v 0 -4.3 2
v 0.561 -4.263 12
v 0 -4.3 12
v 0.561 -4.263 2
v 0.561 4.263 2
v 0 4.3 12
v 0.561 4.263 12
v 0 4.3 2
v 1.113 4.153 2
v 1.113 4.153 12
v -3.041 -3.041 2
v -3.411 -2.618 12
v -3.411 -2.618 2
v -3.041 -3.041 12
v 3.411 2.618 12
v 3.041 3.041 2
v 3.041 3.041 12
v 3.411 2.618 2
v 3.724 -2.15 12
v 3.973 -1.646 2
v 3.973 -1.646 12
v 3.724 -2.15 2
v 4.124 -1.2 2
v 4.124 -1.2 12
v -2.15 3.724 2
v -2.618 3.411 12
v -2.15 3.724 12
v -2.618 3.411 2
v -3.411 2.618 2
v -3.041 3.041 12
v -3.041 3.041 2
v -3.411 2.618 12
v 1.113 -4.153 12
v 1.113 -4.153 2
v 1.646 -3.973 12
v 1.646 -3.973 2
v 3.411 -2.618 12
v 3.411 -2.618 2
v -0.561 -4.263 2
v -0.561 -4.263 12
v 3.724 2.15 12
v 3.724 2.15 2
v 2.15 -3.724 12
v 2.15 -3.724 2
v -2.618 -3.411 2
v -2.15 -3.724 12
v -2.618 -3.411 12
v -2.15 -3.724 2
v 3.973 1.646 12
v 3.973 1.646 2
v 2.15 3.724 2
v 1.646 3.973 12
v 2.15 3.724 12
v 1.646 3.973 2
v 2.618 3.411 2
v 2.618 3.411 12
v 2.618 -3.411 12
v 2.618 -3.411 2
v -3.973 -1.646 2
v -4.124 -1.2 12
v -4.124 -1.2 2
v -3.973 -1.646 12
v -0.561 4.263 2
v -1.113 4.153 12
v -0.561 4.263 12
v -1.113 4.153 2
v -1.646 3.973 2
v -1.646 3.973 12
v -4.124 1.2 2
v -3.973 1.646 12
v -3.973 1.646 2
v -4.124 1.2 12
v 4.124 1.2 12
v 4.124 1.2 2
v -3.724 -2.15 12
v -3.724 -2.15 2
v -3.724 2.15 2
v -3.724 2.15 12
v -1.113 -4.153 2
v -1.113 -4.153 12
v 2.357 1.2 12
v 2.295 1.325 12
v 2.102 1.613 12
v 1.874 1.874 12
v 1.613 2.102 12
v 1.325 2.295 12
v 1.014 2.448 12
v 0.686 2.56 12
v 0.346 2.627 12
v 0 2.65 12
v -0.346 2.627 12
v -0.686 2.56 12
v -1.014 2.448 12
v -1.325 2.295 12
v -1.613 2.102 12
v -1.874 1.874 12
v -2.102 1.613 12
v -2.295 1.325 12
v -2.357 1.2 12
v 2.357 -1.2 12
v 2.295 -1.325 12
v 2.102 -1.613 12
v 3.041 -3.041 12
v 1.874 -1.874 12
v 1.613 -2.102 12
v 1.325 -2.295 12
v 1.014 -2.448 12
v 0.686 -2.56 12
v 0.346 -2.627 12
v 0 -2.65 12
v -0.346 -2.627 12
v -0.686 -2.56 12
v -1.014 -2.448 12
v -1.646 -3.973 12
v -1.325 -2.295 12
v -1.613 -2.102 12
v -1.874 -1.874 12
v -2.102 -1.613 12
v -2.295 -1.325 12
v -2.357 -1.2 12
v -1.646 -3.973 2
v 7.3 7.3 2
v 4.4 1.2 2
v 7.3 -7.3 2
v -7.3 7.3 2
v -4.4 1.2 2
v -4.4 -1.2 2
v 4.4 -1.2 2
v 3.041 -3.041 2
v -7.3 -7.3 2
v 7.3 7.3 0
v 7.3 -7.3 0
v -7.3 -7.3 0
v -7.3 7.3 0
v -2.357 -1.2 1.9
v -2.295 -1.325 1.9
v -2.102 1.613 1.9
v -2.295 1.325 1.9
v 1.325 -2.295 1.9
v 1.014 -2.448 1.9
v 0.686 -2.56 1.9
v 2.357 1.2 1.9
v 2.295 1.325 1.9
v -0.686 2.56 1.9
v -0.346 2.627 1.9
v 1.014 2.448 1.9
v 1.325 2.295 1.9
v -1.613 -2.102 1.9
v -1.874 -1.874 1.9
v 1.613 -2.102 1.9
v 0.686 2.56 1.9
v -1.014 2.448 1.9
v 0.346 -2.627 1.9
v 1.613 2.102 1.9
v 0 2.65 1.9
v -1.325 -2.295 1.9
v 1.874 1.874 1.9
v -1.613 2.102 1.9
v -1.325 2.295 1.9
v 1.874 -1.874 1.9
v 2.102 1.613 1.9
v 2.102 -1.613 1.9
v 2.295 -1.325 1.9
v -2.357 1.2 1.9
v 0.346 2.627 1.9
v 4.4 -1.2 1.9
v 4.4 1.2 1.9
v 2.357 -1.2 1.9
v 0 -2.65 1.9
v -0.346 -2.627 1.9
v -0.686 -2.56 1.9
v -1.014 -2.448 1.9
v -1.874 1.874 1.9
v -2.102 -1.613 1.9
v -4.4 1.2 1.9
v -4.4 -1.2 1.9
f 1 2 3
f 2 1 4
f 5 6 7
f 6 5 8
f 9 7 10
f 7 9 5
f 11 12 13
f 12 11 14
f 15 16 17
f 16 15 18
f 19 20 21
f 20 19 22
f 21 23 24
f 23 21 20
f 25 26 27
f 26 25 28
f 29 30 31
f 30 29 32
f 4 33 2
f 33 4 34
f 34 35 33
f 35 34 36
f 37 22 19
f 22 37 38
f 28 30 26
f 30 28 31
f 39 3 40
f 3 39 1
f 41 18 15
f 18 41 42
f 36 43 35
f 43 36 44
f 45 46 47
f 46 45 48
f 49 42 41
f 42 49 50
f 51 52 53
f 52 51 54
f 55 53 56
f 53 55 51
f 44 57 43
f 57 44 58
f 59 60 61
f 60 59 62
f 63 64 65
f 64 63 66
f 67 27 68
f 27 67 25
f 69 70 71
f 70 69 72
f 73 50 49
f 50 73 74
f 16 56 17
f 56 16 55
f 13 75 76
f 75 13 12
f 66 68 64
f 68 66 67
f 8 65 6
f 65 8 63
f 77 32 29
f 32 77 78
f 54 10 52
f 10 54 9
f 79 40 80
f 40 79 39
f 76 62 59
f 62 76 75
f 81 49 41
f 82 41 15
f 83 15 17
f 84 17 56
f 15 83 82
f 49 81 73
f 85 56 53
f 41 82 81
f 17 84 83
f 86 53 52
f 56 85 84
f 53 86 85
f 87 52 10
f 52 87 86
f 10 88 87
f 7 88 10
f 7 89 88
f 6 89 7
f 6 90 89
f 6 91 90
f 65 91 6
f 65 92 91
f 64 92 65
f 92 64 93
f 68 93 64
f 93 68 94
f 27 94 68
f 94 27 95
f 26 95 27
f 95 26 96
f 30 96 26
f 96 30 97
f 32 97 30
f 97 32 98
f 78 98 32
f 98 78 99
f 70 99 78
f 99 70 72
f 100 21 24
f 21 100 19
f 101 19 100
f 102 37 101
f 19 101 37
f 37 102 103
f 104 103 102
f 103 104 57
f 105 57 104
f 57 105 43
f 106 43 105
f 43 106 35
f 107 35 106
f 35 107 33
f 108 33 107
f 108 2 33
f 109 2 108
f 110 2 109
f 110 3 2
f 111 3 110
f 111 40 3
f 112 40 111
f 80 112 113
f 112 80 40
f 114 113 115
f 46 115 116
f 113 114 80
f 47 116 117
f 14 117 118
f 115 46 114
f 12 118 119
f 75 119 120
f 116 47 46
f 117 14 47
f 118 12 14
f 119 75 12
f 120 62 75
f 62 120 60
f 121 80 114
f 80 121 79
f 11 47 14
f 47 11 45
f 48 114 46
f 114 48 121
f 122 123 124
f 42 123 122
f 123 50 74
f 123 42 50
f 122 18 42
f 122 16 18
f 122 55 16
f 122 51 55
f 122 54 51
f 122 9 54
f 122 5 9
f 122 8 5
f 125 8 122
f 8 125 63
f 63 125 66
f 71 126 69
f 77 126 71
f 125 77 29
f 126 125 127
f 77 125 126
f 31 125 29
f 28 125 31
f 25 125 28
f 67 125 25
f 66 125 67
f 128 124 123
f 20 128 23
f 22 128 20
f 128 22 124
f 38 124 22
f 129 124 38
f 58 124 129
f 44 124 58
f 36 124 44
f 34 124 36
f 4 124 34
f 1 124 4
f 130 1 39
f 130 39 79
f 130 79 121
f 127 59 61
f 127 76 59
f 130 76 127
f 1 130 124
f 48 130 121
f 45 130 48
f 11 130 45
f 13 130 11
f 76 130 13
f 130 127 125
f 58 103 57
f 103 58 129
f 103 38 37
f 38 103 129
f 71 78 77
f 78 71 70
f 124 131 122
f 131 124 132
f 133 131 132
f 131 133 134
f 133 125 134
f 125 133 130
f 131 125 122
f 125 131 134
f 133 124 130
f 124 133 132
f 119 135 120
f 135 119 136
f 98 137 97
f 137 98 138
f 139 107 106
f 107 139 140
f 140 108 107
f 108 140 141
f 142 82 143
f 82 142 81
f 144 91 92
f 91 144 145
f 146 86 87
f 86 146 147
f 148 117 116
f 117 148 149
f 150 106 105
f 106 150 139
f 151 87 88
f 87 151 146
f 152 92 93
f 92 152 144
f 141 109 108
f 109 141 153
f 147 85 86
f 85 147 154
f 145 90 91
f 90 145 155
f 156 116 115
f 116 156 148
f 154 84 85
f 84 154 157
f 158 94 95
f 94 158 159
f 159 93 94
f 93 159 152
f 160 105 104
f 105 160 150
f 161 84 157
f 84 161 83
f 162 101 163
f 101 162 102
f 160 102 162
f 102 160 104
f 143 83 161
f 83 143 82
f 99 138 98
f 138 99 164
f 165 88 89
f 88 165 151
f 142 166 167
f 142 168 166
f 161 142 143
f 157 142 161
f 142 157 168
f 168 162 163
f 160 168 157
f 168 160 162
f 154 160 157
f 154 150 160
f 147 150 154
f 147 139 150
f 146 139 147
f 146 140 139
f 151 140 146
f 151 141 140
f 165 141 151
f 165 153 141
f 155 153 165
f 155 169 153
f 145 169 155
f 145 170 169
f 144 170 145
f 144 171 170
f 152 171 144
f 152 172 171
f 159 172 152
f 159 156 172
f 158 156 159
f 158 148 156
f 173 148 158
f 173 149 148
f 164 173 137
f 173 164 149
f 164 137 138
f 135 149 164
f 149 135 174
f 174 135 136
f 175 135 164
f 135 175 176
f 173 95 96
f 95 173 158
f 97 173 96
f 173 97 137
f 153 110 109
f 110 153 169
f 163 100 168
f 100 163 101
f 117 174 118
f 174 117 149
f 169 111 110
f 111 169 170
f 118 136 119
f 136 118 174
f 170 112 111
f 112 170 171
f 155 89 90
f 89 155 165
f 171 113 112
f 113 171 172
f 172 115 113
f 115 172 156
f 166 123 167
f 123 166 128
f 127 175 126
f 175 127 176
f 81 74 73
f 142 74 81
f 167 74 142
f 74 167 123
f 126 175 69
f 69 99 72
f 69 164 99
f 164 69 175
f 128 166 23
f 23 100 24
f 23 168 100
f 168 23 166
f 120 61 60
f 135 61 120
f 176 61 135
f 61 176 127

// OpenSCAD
// Snap cable clip — C-groove + adhesive base pad
cable_d = 5;
wall = 1.8;
length = 12;
slot_w = 2.4;
base_pad = 3;
base_h = 2;
$fn = 48;

r_outer = cable_d / 2 + wall;

difference() {
  union() {
    translate([0, 0, base_h])
      cylinder(h = length - base_h, r = r_outer);
    translate([-r_outer - base_pad, -r_outer - base_pad, 0])
      cube([2 * (r_outer + base_pad), 2 * (r_outer + base_pad), base_h]);
  }
  translate([0, 0, base_h - 0.1])
    cylinder(h = length - base_h + 0.2, r = cable_d / 2 + 0.15);
  translate([-r_outer - 0.1, -slot_w / 2, base_h - 0.1])
    cube([2 * r_outer + 0.2, slot_w, length - base_h + 0.2]);
}
